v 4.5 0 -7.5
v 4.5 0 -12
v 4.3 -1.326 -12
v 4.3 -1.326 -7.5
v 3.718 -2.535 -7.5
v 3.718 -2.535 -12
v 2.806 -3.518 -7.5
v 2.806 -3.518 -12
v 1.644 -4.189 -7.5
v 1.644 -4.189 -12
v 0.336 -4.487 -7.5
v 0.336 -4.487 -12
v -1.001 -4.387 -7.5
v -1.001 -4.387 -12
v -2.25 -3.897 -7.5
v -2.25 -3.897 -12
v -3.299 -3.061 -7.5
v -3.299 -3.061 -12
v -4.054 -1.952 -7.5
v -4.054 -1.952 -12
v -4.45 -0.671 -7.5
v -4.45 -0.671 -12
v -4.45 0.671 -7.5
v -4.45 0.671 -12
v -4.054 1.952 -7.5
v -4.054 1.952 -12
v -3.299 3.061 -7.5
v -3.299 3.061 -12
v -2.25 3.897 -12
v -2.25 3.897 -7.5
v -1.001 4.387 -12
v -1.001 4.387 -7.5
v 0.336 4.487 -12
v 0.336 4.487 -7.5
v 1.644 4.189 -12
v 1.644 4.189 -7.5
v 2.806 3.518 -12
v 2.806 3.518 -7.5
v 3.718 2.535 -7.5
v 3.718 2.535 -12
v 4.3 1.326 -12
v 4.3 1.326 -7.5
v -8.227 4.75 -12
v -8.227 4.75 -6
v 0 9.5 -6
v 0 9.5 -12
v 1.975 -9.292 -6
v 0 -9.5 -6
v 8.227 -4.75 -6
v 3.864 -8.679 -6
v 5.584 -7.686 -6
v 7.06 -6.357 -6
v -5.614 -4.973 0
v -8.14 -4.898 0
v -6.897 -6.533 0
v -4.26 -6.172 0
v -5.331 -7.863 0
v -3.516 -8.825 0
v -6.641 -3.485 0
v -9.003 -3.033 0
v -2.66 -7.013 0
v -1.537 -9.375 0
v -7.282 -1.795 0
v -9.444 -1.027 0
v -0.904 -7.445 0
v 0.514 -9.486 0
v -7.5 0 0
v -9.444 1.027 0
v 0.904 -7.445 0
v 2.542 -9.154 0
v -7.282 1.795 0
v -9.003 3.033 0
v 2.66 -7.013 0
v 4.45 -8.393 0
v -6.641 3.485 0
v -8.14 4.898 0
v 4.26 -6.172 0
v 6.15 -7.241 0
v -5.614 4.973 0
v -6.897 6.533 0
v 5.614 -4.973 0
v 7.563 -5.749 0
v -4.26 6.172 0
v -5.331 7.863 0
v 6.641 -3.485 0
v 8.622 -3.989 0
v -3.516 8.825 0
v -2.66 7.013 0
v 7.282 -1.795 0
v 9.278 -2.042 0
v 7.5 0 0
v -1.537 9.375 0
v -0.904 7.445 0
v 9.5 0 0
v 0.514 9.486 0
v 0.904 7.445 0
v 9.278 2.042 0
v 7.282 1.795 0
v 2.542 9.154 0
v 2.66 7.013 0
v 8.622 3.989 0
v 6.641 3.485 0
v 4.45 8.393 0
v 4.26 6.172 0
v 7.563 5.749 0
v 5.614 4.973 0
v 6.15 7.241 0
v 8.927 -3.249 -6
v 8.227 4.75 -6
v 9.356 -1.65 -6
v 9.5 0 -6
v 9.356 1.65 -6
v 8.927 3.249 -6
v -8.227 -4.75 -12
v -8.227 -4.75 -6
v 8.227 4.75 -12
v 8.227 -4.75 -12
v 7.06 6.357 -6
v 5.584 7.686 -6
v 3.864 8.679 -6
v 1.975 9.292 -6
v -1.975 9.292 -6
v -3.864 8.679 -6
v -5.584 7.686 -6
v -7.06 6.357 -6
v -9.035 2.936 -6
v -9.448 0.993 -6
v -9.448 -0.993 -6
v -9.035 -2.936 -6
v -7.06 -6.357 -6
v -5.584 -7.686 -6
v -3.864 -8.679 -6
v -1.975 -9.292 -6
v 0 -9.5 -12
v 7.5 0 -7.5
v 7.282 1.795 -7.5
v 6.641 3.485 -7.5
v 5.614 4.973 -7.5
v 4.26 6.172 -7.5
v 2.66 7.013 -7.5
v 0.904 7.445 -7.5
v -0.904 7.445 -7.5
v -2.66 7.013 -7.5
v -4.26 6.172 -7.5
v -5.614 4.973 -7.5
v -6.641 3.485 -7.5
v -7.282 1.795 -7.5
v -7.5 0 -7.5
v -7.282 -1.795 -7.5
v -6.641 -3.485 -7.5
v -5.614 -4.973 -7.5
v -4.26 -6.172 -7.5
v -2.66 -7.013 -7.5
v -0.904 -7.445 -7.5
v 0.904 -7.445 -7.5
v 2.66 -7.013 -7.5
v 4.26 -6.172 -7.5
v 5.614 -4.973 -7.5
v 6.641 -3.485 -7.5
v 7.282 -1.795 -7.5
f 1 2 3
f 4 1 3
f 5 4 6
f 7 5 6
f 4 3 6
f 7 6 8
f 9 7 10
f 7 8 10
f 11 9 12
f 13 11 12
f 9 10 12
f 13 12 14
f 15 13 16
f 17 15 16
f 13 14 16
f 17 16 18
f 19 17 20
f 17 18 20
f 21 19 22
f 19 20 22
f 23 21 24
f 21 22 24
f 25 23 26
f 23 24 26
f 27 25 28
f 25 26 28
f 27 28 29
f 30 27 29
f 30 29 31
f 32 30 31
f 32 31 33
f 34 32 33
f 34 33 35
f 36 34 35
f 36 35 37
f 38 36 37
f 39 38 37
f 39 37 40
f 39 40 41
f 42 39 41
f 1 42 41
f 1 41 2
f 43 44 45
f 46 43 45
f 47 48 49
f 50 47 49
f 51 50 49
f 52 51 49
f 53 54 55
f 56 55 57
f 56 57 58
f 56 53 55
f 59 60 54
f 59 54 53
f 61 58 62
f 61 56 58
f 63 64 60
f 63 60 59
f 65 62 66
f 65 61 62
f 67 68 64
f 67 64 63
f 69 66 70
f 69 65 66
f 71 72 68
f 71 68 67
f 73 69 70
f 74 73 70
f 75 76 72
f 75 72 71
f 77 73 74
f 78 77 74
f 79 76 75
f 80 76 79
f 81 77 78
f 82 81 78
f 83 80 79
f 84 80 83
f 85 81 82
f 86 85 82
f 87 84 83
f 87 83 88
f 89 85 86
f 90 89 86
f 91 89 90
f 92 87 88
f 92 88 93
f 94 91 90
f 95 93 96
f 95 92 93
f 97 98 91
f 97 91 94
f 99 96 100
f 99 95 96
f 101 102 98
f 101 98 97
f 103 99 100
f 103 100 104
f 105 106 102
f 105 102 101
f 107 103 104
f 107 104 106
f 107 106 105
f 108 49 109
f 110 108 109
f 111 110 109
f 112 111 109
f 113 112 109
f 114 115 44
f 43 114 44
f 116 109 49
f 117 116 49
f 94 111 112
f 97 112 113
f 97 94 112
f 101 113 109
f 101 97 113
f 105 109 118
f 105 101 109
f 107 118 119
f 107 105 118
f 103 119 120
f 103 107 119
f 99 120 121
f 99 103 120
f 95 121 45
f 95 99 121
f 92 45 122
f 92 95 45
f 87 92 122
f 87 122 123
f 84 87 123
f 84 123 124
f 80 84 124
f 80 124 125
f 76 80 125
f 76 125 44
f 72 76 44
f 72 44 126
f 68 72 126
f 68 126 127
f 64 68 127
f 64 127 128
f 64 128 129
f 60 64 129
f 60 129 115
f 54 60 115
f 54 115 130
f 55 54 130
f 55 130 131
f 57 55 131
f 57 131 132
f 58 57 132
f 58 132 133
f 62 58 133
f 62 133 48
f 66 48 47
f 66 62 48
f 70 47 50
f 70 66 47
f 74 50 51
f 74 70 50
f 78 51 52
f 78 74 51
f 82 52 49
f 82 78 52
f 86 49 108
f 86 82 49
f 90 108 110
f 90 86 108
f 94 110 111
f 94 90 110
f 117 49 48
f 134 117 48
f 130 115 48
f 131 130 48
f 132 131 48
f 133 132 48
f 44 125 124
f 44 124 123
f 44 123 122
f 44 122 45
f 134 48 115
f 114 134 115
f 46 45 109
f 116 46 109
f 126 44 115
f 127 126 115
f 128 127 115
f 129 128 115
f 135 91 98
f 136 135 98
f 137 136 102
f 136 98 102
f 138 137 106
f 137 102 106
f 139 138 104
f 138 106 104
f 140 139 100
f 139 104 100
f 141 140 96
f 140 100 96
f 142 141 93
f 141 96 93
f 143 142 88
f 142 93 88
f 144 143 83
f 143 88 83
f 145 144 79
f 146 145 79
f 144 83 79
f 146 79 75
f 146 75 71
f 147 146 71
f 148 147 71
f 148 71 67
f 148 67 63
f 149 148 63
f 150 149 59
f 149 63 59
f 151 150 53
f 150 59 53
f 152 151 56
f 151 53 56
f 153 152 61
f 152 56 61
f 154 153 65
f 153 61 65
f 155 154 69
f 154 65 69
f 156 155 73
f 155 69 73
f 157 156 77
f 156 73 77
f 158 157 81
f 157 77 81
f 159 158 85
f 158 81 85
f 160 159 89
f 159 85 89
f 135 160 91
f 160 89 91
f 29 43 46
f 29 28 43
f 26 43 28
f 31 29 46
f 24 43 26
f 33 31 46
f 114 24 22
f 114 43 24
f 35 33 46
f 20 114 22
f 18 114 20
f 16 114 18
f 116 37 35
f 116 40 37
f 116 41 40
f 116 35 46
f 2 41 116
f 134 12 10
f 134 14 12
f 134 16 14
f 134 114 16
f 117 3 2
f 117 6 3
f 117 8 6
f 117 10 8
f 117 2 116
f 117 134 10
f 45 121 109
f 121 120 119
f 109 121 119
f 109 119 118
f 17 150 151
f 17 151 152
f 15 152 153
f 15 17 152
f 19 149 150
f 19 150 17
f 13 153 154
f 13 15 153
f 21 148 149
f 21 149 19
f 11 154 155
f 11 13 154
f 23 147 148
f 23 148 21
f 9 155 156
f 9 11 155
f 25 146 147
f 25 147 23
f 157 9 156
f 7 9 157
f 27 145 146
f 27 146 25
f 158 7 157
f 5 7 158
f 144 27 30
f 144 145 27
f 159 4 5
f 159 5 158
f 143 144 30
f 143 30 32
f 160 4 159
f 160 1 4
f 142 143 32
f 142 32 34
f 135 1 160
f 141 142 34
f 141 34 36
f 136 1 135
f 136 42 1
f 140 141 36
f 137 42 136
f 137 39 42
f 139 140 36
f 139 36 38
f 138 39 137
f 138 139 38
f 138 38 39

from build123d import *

# Parameters (mm, degrees)
SKETCH_R        = 9.5
PAD_DEPTH       = 6
PAD001_DEPTH    = 6
SKETCH002_R     = 4.5
POCKET_DEPTH    = 8
SKETCH003_R     = 7.5
POCKET001_DEPTH = 7.5


with BuildPart() as part:
    # Sketch → Pad (new body)
    with BuildSketch(Plane.XY):
        Circle(SKETCH_R)
    extrude(amount=-PAD_DEPTH)

    # Sketch001 → Pad001 (new body)
    with BuildSketch(Plane(origin=(0, 0, -6), x_dir=(1, 0, 0), z_dir=(0, 0, -1))):
        Polygon((8.227241, -4.75), (8.227241, 4.75), (0, 9.5), (-8.227241, 4.75), (-8.227241, -4.75), (0, -9.5), align=None)
    extrude(amount=PAD001_DEPTH)

    # Sketch002 → Pocket (cut)
    with BuildSketch(Plane(origin=(0, 0, -12), x_dir=(1, 0, 0), z_dir=(0, 0, -1))):
        Circle(SKETCH002_R)
    extrude(amount=-POCKET_DEPTH, mode=Mode.SUBTRACT)

    # Sketch003 → Pocket001 (cut)
    with BuildSketch(Plane.XY):
        Circle(SKETCH003_R)
    extrude(amount=-POCKET001_DEPTH, mode=Mode.SUBTRACT)


solid = part.part
